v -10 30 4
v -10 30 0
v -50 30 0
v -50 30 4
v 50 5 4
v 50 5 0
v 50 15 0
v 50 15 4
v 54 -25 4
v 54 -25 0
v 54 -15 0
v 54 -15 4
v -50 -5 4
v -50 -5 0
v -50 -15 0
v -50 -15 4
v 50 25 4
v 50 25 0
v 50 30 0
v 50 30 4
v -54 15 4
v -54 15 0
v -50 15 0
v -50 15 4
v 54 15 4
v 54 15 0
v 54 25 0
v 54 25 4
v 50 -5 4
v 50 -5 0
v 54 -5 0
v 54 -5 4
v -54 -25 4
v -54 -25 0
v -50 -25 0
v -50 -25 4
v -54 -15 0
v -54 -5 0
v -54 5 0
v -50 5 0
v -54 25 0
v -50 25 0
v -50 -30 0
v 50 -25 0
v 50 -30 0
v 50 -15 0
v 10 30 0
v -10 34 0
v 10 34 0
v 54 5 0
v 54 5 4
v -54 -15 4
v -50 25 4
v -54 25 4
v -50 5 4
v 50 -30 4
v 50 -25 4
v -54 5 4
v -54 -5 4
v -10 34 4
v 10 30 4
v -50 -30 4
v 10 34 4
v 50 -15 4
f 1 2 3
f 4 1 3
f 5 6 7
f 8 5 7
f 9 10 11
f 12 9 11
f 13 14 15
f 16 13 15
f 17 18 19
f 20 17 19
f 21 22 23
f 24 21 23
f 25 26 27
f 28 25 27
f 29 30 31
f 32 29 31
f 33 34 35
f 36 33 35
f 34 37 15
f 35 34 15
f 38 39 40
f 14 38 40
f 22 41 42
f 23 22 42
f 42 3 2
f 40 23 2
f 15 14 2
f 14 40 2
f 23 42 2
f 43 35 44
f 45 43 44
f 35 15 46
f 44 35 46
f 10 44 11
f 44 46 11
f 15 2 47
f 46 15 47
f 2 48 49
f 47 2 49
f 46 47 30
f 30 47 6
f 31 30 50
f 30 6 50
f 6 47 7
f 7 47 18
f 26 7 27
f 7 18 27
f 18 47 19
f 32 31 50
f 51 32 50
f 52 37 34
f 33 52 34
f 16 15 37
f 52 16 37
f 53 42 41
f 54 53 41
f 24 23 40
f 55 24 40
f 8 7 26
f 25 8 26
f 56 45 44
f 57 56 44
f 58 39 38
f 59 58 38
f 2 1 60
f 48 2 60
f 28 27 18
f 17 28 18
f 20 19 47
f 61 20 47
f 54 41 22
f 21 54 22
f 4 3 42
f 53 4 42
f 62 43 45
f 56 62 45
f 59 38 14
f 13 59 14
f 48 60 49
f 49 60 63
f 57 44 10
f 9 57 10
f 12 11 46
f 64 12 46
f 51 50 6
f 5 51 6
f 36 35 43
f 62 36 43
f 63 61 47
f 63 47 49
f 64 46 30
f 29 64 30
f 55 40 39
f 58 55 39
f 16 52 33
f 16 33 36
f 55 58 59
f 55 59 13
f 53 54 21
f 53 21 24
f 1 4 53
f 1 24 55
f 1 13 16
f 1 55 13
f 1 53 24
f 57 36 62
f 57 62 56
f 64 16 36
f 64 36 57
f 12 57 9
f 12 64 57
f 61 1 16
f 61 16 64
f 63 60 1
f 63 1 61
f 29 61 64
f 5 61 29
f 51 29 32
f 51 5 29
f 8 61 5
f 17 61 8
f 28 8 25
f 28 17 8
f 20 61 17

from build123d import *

# Parameters (mm, degrees)
BOSS_EXTRUDE1_DEPTH = 4
SKETCH2_W           = 20
SKETCH2_H           = 8
BOSS_EXTRUDE2_DEPTH = 4


with BuildPart() as part:
    # Sketch1 → Boss-Extrude1 (new body)
    with BuildSketch(Plane.XY):
        Polygon((-50, 30), (-50, 25), (-54, 25), (-54, 15), (-50, 15), (-50, 5), (-54, 5), (-54, -5), (-50, -5), (-50, -15), (-54, -15), (-54, -25), (-50, -25), (-50, -30), (50, -30), (50, -25), (54, -25), (54, -15), (50, -15), (50, -5), (54, -5), (54, 5), (50, 5), (50, 15), (54, 15), (54, 25), (50, 25), (50, 30), align=None)
    extrude(amount=BOSS_EXTRUDE1_DEPTH)

    # Sketch2 → Boss-Extrude2 (add)
    with BuildSketch(Plane.XY.offset(4)):
        with Locations((0, 30)):
            Rectangle(SKETCH2_W, SKETCH2_H)
    extrude(amount=-BOSS_EXTRUDE2_DEPTH)


solid = part.part
